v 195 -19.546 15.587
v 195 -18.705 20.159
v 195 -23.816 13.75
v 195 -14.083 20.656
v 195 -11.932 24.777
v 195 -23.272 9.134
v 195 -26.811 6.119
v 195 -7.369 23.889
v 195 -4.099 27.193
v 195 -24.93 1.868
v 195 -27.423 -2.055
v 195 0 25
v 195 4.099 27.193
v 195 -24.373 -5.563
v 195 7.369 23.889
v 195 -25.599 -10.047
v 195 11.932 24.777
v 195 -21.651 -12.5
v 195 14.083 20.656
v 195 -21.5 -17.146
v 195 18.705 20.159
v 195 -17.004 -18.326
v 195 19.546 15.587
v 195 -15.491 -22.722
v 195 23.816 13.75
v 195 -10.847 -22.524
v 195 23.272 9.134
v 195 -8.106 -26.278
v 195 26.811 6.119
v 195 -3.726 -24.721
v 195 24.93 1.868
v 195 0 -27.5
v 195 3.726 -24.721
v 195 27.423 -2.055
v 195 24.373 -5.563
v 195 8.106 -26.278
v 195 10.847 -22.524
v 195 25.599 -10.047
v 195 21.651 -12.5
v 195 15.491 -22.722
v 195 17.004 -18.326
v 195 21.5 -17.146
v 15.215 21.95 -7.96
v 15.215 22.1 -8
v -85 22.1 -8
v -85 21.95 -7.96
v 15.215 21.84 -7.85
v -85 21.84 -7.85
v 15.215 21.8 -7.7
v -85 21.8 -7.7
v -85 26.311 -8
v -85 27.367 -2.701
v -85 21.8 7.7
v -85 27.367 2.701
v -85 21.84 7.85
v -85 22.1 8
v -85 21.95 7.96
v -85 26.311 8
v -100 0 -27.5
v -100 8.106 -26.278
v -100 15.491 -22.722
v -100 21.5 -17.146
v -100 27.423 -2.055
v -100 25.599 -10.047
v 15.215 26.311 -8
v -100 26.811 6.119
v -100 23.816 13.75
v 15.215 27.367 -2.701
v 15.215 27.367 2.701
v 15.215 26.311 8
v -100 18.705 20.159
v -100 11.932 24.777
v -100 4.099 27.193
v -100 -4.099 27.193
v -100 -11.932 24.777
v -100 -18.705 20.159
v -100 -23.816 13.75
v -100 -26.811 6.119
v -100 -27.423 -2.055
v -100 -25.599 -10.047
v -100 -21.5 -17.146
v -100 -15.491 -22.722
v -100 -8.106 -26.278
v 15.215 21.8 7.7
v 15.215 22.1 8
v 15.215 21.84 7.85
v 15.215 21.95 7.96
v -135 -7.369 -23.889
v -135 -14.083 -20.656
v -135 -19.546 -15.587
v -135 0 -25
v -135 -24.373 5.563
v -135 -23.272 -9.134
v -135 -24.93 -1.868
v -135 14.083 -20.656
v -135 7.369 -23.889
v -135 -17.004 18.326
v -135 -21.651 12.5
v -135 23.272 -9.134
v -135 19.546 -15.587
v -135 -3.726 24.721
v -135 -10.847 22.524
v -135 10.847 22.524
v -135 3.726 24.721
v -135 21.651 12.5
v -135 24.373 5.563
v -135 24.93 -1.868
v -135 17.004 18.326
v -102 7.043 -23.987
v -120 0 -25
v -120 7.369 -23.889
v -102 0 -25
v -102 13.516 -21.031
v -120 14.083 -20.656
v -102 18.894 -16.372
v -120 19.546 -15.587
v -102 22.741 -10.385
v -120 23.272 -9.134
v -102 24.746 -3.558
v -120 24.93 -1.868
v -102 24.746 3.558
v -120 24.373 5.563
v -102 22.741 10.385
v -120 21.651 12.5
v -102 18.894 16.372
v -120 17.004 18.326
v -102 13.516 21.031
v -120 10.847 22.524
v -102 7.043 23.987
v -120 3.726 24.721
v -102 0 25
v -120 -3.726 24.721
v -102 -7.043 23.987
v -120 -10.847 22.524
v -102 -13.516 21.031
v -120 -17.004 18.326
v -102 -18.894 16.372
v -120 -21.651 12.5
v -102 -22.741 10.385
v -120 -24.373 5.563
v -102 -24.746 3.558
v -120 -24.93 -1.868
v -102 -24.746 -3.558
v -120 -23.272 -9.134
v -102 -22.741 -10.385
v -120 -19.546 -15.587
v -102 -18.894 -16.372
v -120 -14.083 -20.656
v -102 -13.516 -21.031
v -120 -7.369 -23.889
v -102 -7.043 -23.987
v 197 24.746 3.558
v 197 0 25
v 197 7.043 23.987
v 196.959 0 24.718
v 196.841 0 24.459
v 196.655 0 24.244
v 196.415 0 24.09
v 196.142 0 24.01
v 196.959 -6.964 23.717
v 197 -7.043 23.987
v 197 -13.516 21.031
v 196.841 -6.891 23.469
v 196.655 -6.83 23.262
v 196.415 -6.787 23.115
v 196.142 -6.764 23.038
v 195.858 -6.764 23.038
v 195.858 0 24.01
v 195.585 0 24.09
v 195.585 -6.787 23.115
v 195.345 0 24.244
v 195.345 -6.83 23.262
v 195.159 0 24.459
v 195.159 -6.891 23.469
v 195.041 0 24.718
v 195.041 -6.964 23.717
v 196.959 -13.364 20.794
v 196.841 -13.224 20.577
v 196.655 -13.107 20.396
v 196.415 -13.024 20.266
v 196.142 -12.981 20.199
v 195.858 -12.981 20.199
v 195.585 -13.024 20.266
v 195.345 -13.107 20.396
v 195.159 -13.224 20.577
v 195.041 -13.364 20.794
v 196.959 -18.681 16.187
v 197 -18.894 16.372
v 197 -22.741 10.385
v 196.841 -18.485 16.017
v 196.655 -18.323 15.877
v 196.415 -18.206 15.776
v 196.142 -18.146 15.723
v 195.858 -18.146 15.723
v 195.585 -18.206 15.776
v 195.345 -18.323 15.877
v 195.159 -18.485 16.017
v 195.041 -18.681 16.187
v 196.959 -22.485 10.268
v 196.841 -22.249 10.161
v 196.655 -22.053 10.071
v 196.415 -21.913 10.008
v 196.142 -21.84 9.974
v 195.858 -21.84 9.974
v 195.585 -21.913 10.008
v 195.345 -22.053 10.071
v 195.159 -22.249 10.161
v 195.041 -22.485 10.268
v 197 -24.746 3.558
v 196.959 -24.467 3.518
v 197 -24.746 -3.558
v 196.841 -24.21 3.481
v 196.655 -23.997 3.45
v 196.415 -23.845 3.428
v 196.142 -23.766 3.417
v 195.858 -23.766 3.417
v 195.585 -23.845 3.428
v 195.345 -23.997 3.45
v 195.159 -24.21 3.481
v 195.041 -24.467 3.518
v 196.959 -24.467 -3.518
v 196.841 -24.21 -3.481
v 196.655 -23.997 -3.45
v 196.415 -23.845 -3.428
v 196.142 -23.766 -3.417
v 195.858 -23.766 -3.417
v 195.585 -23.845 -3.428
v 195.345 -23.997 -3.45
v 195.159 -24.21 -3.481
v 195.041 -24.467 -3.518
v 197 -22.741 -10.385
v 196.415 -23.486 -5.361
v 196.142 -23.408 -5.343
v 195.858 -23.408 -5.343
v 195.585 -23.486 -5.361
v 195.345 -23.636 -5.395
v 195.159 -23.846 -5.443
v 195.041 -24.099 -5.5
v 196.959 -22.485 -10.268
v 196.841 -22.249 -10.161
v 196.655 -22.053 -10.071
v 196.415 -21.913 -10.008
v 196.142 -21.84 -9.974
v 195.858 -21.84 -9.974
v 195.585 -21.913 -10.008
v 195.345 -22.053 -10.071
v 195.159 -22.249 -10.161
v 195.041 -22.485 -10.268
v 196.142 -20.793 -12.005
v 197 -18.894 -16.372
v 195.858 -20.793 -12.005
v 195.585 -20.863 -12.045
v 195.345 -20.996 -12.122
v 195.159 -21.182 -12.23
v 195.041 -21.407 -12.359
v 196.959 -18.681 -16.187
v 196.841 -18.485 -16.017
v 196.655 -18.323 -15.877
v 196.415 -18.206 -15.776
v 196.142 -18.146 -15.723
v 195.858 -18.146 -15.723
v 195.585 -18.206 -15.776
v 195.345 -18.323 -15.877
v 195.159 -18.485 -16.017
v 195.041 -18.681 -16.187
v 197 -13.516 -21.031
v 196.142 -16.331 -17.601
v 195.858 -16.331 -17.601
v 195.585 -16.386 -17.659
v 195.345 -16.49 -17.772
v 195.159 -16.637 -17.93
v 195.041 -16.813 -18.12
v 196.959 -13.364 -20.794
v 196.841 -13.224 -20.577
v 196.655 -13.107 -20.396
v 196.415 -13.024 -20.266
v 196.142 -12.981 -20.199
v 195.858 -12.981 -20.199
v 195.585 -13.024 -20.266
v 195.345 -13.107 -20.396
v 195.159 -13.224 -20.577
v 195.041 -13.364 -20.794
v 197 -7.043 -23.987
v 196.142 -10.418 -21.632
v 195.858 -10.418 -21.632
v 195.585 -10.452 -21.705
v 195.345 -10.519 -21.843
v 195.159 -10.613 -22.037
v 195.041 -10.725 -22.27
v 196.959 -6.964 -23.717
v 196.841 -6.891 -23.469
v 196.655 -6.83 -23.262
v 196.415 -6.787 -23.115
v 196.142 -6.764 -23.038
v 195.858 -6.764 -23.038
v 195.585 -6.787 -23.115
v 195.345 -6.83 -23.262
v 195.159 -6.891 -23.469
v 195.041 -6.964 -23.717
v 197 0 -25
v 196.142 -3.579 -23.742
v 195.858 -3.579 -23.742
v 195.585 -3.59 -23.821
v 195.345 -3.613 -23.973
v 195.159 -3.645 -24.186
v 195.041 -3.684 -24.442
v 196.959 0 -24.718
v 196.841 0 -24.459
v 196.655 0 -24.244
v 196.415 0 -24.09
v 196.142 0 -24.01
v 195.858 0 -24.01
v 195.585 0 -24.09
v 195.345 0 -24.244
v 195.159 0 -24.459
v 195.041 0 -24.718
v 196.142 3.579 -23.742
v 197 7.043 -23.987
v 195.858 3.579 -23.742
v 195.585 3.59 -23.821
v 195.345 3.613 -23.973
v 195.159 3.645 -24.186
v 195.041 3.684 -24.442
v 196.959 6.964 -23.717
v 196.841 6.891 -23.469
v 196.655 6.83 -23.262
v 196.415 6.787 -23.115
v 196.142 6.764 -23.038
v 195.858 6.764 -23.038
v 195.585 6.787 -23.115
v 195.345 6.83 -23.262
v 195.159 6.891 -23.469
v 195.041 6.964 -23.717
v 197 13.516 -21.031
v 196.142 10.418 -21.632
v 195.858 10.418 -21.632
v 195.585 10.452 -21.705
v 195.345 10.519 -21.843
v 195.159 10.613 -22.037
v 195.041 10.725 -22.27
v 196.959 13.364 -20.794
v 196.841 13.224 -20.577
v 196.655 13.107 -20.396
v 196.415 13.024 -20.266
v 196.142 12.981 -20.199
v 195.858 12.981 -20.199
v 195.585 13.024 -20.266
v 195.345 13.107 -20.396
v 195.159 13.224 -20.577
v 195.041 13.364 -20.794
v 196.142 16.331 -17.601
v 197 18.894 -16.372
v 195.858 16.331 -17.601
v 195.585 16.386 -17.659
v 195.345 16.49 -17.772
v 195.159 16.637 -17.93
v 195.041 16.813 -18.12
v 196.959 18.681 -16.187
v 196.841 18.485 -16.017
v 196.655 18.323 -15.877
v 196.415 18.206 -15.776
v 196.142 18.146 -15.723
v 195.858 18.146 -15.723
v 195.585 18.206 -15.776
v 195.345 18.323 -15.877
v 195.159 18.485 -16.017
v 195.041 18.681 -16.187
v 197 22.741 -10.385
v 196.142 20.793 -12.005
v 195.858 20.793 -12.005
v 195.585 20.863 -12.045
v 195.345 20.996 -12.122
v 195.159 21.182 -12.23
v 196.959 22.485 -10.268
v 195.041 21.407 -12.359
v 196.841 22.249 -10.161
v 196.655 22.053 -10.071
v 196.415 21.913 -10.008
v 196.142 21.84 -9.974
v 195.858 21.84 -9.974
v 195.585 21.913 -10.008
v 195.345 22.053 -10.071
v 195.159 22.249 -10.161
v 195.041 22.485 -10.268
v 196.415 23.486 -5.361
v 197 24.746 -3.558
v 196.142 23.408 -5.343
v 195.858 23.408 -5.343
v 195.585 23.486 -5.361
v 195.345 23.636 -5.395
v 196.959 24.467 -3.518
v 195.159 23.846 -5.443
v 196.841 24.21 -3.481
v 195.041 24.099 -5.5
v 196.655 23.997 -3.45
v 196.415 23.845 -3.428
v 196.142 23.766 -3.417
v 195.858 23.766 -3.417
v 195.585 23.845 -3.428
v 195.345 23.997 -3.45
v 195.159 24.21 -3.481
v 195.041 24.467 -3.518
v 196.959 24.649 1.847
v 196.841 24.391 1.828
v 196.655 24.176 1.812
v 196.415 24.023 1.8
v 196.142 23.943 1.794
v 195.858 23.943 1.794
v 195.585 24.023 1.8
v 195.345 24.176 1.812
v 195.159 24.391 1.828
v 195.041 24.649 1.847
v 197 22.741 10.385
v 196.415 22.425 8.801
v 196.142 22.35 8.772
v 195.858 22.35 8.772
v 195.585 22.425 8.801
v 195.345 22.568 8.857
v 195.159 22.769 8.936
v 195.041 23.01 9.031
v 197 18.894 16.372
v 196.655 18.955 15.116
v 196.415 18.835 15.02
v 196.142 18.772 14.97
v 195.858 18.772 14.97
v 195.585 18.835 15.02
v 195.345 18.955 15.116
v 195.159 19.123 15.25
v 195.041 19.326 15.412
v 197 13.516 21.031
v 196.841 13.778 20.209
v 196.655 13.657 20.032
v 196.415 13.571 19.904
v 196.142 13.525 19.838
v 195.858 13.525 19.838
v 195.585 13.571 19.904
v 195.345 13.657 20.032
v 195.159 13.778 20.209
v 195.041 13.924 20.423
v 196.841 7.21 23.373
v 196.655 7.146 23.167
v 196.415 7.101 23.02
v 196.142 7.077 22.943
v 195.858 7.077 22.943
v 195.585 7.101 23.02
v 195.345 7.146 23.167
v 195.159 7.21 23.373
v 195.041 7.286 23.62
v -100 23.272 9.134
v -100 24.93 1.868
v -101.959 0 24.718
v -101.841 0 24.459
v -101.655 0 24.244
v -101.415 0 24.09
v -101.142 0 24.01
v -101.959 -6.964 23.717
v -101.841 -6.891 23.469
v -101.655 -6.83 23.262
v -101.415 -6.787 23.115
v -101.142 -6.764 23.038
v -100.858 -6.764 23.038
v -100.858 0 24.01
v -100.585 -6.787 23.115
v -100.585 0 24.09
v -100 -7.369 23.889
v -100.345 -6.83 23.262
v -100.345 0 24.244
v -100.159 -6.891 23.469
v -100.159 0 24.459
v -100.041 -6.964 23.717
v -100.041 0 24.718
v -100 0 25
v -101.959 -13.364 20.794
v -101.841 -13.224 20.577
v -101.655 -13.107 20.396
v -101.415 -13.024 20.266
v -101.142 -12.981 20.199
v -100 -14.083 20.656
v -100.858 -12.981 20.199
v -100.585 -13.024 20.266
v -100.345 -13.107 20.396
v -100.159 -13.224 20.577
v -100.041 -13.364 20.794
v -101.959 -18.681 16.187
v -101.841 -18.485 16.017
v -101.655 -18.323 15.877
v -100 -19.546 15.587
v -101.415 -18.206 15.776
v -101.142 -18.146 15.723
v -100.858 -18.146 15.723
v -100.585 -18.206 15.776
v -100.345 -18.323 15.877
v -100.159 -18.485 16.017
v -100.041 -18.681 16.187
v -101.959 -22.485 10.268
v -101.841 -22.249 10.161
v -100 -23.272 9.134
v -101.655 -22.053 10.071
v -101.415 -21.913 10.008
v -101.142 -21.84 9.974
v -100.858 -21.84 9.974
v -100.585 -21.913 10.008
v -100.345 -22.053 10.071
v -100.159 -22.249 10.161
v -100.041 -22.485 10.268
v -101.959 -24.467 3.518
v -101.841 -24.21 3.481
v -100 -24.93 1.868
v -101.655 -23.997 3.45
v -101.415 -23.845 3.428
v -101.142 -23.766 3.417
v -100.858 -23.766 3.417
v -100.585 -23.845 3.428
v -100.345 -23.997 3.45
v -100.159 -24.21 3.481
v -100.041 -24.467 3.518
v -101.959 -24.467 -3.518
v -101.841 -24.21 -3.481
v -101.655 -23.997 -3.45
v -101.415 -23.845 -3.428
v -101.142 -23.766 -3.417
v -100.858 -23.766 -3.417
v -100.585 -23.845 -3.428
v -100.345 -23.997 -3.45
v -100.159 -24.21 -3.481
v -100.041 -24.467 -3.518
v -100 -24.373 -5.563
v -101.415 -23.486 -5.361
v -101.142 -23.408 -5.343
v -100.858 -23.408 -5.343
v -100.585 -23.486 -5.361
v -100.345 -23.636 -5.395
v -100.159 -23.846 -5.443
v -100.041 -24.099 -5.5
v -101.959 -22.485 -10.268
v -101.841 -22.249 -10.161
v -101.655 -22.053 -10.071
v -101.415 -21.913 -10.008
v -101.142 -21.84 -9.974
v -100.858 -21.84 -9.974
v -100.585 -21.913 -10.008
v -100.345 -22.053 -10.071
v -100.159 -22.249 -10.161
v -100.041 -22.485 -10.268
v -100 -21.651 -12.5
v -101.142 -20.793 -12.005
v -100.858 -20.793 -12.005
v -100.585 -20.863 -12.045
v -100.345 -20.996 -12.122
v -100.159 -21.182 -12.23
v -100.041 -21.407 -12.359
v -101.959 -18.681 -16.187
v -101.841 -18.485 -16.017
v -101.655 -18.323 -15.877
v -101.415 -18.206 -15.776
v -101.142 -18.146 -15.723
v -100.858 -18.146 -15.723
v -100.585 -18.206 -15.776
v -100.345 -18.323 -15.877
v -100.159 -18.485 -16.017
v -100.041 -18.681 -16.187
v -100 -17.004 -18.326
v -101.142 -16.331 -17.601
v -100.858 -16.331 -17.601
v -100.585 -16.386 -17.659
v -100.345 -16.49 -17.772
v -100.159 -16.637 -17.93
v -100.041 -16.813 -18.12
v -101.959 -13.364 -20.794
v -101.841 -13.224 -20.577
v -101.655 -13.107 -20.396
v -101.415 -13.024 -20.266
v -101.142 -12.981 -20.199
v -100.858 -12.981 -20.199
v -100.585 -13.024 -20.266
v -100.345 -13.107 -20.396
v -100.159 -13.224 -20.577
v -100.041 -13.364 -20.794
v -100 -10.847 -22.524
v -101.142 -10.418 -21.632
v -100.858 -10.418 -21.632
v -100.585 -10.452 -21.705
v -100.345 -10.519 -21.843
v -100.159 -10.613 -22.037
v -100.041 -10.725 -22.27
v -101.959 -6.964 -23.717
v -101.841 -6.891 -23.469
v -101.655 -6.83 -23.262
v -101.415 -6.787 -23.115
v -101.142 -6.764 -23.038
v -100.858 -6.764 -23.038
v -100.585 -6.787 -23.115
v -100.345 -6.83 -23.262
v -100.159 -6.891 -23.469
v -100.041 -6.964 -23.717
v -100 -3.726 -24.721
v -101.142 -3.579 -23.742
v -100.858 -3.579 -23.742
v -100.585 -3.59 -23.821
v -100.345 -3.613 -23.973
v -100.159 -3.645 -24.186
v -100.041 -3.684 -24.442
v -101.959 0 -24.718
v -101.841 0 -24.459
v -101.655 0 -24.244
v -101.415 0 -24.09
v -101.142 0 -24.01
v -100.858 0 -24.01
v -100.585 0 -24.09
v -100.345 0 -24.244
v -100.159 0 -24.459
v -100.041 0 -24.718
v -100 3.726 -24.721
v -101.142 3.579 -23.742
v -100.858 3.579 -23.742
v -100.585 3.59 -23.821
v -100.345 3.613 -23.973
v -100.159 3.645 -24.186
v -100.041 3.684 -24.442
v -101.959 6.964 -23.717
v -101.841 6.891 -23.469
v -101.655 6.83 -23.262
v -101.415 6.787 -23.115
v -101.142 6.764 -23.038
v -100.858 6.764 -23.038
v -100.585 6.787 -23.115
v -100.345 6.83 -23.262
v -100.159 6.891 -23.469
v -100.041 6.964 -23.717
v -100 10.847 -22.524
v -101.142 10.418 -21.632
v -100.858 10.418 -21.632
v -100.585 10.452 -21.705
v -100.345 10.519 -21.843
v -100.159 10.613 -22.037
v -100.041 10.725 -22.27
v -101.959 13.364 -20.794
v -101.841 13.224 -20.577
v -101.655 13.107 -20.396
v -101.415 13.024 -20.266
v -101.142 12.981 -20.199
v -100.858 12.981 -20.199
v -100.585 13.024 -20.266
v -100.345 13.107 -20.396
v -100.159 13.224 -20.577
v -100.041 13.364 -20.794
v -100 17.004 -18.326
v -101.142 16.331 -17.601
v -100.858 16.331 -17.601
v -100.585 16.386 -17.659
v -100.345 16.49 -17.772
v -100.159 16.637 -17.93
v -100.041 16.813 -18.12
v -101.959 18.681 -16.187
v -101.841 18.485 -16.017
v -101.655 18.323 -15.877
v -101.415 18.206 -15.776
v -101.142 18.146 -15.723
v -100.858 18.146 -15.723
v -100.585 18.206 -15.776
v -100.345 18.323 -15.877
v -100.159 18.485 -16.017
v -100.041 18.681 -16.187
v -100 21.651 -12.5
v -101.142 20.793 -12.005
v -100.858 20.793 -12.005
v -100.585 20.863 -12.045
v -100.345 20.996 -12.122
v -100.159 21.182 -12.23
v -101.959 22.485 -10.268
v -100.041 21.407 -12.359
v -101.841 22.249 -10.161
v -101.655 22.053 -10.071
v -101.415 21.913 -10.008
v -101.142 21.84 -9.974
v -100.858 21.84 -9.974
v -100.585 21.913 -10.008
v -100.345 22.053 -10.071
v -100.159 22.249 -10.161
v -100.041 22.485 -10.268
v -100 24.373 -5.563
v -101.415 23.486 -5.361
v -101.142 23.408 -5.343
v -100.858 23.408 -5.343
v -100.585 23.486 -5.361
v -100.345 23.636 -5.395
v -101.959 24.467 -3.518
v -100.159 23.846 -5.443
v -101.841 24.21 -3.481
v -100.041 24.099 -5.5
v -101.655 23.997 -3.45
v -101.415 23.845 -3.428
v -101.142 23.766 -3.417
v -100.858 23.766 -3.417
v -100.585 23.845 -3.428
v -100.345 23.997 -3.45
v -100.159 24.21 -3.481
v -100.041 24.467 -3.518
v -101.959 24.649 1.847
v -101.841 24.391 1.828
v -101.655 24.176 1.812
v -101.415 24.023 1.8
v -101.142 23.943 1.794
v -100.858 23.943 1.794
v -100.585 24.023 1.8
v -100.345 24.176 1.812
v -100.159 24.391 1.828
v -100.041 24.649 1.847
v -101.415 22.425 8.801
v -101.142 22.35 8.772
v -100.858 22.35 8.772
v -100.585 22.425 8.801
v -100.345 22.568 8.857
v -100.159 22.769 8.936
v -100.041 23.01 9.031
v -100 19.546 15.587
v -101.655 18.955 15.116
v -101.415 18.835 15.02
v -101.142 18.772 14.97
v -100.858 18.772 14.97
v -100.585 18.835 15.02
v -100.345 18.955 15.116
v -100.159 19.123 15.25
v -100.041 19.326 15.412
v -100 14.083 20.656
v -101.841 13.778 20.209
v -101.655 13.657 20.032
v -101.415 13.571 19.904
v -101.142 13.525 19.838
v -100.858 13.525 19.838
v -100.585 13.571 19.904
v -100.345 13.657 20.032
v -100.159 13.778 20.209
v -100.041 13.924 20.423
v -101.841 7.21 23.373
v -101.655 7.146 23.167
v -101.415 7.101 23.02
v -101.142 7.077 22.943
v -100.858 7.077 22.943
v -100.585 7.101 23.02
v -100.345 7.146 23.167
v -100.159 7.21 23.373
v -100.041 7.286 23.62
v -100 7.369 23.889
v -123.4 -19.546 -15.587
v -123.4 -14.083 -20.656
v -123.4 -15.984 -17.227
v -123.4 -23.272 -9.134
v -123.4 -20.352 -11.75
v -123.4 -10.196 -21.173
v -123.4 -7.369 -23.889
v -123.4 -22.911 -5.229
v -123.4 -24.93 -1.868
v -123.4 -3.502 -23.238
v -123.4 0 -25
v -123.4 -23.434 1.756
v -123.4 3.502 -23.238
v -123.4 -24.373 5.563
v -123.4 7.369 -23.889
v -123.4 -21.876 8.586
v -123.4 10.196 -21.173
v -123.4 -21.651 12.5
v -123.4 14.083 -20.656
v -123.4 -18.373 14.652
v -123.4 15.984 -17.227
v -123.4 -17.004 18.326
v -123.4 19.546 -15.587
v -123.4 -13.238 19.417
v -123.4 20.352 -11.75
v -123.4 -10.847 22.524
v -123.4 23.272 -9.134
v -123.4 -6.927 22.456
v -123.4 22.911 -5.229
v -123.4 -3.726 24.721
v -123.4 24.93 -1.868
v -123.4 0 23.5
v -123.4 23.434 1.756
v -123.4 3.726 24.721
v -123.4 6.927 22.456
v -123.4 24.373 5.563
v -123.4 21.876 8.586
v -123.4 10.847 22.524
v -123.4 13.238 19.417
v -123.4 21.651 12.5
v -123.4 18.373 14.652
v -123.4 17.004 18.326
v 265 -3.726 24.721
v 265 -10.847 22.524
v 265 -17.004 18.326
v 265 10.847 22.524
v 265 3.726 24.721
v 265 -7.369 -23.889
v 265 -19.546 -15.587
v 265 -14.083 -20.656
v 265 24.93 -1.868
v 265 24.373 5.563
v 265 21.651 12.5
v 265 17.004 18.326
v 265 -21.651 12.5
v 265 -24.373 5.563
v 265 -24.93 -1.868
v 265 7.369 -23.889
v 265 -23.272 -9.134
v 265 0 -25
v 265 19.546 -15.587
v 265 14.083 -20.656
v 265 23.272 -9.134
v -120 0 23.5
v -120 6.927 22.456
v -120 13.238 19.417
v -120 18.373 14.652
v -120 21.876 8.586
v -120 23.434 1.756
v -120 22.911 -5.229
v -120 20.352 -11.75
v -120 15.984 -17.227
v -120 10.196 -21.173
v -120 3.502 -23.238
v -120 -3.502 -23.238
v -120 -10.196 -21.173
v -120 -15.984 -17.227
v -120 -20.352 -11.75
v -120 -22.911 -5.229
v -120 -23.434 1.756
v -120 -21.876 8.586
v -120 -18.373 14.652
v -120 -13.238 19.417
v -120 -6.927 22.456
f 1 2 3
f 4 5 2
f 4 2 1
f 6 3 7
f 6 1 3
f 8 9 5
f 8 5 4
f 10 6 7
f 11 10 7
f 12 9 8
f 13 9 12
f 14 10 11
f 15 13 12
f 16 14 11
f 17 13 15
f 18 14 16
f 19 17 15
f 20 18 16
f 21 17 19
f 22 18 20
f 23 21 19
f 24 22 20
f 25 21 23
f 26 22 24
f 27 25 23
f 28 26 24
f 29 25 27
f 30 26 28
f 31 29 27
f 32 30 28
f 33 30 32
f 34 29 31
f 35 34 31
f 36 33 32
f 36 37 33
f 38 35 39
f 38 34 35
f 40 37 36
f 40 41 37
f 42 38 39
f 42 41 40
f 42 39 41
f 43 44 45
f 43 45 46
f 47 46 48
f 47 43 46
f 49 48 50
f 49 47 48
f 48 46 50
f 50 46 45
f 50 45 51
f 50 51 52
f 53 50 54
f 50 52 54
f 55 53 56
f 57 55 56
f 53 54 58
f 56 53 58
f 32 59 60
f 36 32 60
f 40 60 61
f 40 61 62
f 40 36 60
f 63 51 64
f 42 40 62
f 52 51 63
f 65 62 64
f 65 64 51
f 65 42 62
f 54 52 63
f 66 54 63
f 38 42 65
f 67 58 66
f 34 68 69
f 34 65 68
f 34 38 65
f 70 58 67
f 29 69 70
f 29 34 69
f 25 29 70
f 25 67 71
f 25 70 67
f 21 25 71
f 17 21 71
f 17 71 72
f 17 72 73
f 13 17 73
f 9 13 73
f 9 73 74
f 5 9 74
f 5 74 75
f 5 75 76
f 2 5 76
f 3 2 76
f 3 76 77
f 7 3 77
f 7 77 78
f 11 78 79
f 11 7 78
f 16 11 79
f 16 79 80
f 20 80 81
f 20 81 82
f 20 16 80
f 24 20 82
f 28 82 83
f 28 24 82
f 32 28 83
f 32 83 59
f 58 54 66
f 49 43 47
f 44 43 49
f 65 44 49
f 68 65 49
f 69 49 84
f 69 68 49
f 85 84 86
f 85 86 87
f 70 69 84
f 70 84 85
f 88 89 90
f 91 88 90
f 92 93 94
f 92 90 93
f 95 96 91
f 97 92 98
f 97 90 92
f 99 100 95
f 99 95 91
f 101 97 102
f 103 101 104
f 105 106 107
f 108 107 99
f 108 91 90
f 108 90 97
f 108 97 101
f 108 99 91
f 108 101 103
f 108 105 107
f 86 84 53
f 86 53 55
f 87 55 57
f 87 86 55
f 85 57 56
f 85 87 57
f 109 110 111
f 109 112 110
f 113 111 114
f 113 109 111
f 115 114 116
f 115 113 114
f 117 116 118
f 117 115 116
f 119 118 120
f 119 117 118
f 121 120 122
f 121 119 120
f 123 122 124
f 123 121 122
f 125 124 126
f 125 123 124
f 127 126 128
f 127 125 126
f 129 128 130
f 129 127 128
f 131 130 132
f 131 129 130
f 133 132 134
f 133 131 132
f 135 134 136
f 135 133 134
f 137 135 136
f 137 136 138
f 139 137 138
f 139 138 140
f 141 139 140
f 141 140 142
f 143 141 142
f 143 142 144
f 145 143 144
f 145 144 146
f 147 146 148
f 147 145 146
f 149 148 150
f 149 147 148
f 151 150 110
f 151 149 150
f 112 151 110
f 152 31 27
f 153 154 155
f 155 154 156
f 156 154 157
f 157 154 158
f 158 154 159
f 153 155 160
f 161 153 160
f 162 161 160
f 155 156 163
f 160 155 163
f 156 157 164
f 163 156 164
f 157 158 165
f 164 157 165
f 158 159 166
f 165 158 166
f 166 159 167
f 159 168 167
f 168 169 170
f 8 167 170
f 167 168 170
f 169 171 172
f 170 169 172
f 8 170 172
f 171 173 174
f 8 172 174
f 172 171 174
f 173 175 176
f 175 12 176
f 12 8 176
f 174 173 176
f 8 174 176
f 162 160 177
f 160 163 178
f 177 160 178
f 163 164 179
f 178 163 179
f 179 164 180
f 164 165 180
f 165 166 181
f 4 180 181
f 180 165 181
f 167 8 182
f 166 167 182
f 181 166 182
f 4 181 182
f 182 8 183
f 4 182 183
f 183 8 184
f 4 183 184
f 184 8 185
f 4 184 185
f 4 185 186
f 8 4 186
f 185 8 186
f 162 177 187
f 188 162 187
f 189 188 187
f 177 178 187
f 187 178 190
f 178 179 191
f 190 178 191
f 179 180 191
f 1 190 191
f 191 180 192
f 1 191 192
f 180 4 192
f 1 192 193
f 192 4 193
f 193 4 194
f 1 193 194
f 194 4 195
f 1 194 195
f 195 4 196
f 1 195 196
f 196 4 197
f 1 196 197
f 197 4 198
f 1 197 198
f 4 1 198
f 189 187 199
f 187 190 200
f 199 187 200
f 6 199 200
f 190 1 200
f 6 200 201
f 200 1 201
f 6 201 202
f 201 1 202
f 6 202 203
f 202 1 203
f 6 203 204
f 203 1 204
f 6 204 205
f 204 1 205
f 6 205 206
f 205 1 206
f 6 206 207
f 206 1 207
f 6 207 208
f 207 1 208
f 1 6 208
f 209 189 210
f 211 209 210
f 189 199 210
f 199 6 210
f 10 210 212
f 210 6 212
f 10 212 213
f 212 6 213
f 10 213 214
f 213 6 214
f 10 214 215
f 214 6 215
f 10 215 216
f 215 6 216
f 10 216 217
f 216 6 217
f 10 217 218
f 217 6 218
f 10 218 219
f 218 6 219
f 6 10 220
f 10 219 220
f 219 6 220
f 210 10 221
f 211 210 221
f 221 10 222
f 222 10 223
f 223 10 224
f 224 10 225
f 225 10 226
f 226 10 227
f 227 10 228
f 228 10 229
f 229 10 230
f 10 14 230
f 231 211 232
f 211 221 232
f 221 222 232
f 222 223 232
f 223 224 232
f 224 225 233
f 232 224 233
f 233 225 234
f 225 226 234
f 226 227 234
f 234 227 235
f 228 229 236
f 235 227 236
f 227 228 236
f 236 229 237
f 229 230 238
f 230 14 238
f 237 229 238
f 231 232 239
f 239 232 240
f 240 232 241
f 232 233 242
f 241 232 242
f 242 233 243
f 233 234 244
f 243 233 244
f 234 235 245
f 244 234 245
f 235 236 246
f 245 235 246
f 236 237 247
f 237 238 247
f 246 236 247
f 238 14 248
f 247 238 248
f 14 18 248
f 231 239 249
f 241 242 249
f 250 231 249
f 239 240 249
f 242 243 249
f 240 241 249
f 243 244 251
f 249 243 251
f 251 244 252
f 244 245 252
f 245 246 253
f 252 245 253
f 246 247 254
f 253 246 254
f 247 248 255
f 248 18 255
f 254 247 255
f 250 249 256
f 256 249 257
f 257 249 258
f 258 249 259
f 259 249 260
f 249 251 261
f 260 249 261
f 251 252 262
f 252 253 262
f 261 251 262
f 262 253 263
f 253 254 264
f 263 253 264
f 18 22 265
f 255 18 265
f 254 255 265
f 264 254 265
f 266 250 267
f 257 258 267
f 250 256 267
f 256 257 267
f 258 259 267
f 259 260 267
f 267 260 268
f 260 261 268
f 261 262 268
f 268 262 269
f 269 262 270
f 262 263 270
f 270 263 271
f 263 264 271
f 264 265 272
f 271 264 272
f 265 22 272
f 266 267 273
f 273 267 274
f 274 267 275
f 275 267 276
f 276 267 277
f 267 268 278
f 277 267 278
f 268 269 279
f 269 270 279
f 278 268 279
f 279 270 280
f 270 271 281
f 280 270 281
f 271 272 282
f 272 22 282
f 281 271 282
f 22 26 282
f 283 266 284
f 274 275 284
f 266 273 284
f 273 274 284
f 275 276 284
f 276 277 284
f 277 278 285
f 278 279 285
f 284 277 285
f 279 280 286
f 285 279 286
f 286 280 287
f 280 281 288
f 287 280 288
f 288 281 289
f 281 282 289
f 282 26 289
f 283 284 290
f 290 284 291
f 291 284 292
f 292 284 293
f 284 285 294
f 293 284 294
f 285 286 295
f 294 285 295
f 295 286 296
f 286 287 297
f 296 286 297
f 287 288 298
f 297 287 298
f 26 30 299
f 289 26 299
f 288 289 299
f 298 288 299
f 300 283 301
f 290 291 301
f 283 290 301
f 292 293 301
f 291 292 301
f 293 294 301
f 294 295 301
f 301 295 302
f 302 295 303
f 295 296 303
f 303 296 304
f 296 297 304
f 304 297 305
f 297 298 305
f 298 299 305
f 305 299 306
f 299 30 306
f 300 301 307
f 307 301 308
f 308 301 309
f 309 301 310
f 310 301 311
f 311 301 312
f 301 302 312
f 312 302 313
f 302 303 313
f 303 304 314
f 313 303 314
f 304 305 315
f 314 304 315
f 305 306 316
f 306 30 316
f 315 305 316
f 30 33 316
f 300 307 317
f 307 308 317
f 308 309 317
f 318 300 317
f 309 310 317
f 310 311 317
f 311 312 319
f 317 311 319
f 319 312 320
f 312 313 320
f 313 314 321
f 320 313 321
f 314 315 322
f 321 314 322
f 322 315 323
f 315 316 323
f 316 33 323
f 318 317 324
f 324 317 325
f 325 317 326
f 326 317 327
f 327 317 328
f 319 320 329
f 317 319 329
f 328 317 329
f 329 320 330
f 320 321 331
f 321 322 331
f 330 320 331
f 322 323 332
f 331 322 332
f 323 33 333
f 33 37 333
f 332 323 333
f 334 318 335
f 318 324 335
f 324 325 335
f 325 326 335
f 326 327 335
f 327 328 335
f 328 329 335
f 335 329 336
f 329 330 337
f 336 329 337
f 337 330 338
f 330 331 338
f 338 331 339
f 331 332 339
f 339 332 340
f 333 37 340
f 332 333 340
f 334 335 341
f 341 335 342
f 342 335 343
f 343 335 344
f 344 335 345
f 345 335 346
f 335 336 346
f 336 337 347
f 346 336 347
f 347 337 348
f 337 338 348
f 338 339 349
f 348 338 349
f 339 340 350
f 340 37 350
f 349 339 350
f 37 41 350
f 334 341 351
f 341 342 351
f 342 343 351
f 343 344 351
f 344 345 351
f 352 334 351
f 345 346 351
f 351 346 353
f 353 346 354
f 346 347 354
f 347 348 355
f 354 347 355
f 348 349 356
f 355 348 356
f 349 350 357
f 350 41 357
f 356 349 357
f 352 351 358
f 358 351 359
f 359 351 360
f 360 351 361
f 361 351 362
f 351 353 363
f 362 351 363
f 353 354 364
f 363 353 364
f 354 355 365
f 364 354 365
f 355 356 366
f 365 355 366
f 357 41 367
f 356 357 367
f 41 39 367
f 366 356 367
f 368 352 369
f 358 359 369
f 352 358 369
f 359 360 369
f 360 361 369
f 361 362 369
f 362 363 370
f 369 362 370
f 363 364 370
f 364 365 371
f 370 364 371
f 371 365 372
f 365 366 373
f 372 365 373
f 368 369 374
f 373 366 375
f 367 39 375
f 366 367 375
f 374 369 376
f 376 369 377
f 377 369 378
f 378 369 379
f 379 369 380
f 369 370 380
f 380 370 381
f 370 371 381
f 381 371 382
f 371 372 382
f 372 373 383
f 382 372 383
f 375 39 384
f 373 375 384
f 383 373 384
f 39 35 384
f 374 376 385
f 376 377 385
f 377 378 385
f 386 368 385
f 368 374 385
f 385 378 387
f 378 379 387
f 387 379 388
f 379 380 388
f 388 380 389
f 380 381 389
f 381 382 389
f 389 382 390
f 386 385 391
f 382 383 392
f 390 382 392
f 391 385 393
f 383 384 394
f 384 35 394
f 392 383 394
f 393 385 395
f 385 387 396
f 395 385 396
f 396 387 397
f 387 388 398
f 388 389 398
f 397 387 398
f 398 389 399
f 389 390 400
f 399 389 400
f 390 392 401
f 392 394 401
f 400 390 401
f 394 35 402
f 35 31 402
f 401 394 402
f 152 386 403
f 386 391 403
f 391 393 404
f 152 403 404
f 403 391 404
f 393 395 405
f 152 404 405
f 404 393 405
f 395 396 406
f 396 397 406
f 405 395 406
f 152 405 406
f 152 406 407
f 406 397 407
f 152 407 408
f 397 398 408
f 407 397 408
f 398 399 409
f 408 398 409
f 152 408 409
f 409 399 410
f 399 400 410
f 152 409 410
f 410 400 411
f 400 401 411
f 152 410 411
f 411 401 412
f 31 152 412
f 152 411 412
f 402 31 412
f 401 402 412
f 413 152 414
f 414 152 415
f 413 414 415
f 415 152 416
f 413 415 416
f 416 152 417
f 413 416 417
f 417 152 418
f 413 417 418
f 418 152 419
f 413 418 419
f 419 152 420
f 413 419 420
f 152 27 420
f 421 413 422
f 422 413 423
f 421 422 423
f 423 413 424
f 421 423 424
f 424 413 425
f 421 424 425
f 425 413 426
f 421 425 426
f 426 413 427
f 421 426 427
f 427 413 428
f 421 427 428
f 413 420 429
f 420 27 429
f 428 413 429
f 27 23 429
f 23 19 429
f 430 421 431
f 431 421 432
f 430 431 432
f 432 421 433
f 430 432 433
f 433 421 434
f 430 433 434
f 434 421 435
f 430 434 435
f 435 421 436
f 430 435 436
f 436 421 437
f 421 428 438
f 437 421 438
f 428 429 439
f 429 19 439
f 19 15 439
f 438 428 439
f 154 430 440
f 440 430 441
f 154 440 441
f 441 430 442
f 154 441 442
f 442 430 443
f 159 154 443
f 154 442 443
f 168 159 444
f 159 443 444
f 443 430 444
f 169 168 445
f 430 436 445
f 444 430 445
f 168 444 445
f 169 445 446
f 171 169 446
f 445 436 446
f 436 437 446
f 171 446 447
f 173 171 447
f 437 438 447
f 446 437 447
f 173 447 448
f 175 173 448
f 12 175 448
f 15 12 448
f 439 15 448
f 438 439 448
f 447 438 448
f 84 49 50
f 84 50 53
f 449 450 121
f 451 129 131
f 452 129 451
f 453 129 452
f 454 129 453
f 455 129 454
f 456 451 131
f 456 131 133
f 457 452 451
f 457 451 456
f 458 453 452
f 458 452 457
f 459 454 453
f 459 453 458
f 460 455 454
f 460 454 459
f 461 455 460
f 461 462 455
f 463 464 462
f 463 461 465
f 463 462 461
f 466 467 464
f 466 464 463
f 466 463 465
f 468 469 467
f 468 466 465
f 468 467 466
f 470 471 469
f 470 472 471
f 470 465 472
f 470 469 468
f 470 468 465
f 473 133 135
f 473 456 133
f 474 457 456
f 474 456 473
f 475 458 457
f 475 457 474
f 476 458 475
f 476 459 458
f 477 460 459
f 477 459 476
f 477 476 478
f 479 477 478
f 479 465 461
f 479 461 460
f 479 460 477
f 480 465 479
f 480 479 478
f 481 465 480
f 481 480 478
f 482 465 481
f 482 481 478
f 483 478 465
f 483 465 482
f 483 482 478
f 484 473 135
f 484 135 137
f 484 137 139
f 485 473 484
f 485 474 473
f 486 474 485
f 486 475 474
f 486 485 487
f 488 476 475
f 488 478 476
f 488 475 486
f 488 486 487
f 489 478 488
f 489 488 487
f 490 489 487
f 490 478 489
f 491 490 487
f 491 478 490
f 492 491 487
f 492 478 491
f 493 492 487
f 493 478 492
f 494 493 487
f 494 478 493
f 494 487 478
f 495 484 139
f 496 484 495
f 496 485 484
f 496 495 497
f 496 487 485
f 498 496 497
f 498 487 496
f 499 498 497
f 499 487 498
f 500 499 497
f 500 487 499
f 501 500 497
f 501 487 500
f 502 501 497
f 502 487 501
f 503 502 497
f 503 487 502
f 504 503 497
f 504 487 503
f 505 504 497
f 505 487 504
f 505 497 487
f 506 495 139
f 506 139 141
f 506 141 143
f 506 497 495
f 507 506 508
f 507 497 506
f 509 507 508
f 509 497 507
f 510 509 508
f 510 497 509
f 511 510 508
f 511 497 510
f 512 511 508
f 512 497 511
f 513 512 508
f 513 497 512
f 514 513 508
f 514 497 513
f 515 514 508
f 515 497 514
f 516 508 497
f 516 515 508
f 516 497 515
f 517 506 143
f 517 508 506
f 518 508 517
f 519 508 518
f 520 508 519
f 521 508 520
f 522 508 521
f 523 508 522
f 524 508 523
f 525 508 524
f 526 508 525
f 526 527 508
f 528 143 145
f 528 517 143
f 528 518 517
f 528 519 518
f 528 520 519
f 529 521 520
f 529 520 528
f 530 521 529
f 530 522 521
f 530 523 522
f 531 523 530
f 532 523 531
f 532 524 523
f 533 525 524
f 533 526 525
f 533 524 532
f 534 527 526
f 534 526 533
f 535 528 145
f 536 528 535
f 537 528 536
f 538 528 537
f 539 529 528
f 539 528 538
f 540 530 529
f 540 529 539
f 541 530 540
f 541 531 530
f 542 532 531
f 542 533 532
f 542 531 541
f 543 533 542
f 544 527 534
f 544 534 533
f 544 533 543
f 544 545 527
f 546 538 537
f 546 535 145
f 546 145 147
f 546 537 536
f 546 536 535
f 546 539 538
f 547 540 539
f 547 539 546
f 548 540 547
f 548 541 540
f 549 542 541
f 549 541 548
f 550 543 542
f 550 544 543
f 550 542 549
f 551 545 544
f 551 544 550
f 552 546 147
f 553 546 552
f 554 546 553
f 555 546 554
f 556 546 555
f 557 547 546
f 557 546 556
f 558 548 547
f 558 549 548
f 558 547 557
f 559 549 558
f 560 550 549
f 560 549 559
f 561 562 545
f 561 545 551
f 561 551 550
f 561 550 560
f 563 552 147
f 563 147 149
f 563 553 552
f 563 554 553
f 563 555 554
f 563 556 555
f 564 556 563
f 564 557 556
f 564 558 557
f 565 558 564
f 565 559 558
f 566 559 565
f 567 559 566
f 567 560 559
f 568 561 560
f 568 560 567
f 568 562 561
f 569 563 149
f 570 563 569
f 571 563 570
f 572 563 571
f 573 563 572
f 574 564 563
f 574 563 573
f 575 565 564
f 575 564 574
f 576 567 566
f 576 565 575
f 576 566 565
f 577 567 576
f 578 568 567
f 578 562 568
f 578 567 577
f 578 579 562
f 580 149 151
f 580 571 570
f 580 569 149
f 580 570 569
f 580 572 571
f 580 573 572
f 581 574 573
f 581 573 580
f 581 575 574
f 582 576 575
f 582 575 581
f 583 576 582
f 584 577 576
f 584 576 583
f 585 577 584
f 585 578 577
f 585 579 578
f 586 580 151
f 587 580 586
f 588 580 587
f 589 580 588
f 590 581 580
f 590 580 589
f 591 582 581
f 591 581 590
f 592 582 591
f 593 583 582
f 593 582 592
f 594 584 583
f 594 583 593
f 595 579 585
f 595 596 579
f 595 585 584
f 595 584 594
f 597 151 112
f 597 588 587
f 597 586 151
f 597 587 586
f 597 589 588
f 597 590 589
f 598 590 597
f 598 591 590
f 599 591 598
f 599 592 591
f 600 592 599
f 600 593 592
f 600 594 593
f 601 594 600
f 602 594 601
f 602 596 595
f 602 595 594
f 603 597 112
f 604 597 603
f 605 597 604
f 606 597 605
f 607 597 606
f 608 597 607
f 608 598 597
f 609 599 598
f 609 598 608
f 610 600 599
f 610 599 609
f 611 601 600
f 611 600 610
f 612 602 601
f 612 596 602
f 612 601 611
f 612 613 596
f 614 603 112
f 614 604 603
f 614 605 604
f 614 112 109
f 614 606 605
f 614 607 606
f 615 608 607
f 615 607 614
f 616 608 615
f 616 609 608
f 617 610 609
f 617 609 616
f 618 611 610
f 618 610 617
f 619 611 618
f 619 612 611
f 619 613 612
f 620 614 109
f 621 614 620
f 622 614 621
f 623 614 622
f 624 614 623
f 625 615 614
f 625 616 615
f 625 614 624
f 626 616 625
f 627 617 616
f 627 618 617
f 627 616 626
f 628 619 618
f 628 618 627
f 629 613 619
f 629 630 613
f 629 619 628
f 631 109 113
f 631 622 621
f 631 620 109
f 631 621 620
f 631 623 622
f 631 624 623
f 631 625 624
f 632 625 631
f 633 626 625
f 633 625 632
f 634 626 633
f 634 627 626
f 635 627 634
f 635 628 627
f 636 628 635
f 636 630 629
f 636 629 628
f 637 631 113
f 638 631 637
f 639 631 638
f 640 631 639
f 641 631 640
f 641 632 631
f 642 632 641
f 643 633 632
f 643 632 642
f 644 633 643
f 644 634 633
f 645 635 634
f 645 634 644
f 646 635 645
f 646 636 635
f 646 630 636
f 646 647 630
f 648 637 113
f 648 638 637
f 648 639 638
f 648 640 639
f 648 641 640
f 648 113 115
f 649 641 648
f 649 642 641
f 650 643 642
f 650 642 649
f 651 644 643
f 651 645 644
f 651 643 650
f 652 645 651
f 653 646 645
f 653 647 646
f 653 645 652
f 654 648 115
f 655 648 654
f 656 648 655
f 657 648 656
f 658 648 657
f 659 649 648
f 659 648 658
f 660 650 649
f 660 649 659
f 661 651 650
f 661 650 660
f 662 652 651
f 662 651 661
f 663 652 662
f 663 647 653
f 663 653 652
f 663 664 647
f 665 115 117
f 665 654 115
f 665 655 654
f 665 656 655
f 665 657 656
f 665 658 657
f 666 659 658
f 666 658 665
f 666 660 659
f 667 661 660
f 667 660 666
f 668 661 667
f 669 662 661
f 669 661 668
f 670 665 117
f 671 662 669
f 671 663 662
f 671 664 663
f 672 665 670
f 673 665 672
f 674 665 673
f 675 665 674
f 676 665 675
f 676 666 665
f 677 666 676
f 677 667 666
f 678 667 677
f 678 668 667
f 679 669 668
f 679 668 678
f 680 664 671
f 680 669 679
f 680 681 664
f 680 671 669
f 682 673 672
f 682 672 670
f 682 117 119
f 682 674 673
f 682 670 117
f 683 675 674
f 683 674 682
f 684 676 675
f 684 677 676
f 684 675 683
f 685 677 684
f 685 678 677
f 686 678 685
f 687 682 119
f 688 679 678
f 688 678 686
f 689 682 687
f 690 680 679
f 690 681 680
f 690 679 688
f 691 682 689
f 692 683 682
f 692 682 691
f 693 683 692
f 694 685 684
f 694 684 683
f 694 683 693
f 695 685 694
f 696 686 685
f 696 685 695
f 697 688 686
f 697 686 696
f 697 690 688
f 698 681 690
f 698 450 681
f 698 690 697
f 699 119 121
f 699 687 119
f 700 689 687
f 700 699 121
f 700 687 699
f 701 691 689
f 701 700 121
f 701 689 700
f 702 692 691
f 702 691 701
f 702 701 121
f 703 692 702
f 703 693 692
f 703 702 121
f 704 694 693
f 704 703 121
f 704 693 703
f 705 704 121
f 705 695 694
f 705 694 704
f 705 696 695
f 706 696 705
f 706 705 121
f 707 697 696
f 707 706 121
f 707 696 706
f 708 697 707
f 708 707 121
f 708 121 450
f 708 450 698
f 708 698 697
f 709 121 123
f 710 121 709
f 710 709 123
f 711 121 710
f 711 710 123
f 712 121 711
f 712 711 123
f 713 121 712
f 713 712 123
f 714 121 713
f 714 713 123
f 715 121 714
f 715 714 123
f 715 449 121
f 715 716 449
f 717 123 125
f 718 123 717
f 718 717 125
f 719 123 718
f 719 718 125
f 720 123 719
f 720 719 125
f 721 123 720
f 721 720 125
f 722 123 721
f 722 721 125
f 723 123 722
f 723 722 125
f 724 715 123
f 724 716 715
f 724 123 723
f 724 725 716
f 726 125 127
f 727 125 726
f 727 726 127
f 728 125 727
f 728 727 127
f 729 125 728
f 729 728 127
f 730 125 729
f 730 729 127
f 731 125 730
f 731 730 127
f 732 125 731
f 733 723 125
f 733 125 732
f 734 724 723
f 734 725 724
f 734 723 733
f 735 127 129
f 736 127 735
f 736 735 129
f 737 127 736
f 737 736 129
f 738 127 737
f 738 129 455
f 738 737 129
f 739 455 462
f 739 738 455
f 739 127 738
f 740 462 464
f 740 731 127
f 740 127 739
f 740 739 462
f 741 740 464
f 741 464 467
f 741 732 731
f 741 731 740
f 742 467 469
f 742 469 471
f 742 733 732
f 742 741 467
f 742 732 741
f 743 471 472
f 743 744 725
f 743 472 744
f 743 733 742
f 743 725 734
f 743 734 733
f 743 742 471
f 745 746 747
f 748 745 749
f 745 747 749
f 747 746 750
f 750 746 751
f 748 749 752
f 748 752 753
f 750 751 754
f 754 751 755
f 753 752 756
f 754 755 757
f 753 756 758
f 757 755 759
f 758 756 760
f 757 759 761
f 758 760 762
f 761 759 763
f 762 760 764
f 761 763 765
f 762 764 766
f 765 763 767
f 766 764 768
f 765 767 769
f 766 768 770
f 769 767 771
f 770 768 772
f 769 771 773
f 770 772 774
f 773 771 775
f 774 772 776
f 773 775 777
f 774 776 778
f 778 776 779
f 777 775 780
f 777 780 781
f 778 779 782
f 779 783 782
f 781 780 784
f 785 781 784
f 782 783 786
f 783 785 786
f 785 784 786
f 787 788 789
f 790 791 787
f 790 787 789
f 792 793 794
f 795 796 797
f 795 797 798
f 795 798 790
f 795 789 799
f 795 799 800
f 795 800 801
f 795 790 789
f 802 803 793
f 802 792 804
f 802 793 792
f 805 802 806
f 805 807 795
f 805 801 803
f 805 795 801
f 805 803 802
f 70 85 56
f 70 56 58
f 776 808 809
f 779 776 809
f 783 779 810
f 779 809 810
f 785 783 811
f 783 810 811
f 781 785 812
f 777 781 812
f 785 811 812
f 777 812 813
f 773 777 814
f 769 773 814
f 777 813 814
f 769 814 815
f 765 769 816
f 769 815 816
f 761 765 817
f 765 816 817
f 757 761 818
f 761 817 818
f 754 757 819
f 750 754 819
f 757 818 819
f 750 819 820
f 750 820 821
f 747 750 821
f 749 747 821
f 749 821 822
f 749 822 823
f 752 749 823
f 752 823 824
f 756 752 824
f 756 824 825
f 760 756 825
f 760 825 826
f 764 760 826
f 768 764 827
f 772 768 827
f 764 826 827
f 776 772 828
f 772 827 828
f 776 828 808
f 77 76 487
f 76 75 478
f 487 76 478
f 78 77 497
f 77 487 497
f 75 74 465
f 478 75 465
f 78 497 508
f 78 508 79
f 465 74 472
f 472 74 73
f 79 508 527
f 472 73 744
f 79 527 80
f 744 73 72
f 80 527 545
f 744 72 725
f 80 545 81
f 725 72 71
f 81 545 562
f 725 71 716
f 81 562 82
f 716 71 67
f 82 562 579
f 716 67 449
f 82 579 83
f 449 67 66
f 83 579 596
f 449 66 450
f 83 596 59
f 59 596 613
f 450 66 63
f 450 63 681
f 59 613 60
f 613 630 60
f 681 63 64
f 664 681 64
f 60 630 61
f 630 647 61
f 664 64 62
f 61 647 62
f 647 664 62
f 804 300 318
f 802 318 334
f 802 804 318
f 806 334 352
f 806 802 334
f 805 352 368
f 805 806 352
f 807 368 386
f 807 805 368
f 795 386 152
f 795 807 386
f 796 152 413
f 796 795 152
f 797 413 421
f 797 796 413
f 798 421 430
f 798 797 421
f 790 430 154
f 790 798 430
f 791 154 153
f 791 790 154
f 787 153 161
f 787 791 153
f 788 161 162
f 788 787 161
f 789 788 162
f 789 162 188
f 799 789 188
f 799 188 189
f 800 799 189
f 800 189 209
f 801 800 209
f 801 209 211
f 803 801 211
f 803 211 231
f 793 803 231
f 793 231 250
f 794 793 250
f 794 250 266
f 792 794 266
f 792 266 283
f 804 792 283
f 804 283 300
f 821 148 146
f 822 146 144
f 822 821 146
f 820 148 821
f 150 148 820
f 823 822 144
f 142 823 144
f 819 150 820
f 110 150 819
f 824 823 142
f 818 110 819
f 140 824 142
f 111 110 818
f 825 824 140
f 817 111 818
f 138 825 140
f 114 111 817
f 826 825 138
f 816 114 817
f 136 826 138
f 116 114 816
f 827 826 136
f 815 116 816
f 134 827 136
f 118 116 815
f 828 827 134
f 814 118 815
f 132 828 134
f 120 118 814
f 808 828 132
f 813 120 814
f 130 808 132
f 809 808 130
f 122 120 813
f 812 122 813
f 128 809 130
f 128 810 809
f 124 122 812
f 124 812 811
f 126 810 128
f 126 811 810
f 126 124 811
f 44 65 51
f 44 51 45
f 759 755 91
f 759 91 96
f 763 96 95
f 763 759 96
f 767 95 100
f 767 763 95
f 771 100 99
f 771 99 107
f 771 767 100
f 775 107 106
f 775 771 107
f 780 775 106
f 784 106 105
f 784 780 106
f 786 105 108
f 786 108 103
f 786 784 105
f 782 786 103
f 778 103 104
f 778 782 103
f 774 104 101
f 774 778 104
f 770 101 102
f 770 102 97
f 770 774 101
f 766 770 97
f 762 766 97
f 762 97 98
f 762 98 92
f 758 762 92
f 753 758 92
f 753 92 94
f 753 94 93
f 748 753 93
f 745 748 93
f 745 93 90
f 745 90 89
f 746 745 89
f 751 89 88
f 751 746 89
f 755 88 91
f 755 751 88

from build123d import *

# Parameters (mm, degrees)
SKETCH1_R           = 27.5
BOSS_EXTRUDE1_DEPTH = 100
SKETCH1_4_R         = 25
BOSS_EXTRUDE2_DEPTH = 175
BOSS_EXTRUDE4_START = 95
SKETCH6_R           = 27.5
SKETCH6_R_2         = 25
BOSS_EXTRUDE4_DEPTH = 95
BOSS_EXTRUDE5_START = 90
SKETCH8_R           = 25
BOSS_EXTRUDE5_DEPTH = 90
CUT_EXTRUDE1_START  = -115.215
CUT_EXTRUDE1_DEPTH  = 100.215
CUT_EXTRUDE3_START  = -40
SKETCH10_R          = 25
CUT_EXTRUDE3_DEPTH  = 40
CUT_EXTRUDE4_START  = 20
SKETCH11_R          = 25
SKETCH11_R_2        = 23.5
CUT_EXTRUDE4_DEPTH  = 3.4


with BuildPart() as part:
    # Sketch1 → Boss-Extrude1 (new, symmetric)
    with BuildSketch(Plane(origin=(0, 0, 0), x_dir=(0, 0, -1), z_dir=(1, 0, 0))):
        Circle(SKETCH1_R)
    extrude(amount=BOSS_EXTRUDE1_DEPTH, both=True)

    # Sketch1<4> → Boss-Extrude2 (add, symmetric)
    with BuildSketch(Plane(origin=(0, 0, 0), x_dir=(0, 0, -1), z_dir=(1, 0, 0))):
        Circle(SKETCH1_4_R)
    extrude(amount=BOSS_EXTRUDE2_DEPTH, both=True)

    # Sketch6 → Boss-Extrude4 (add)
    with BuildSketch(Plane(origin=(100, 0, 0), x_dir=(0, 0, -1), z_dir=(1, 0, 0)).offset(BOSS_EXTRUDE4_START)):
        Circle(SKETCH6_R)
        Circle(SKETCH6_R_2, mode=Mode.SUBTRACT)
    extrude(amount=-BOSS_EXTRUDE4_DEPTH)

    # Sketch8 → Boss-Extrude5 (add)
    with BuildSketch(Plane(origin=(175, 0, 0), x_dir=(0, 0, -1), z_dir=(1, 0, 0)).offset(BOSS_EXTRUDE5_START)):
        Circle(SKETCH8_R)
    extrude(amount=-BOSS_EXTRUDE5_DEPTH)

    # Sketch3 → Cut-Revolve1 (revolve, cut)
    with BuildSketch(Plane.XY):
        with BuildLine():
            Line((195, 25), (197, 25))
            ThreePointArc((197, 25), (196, 24), (195, 25))
        make_face()
        with BuildLine():
            Line((-100, 25), (-102, 25))
            ThreePointArc((-102, 25), (-101, 24), (-100, 25))
        make_face()
    revolve(axis=Axis((-100, 0, 0), (1, 0, 0)), mode=Mode.SUBTRACT)

    # Sketch4 → Cut-Extrude1 (cut)
    with BuildSketch(Plane.ZY.offset(100).offset(CUT_EXTRUDE1_START)):
        with BuildLine():
            Line((-8, 26.310644234), (-8, 22.1))
            ThreePointArc((-8, 22.1), (-7.912132034, 21.887867966), (-7.7, 21.8))
            Line((-7.7, 21.8), (7.7, 21.8))
            ThreePointArc((7.7, 21.8), (7.912132034, 21.887867966), (8, 22.1))
            Line((8, 22.1), (8, 26.310644234))
            ThreePointArc((8, 26.310644234), (0, 27.5), (-8, 26.310644234))
        make_face()
    extrude(amount=CUT_EXTRUDE1_DEPTH, mode=Mode.SUBTRACT)

    # Sketch10 → Cut-Extrude3 (cut)
    with BuildSketch(Plane.ZY.offset(175).offset(CUT_EXTRUDE3_START)):
        Circle(SKETCH10_R)
    extrude(amount=CUT_EXTRUDE3_DEPTH, mode=Mode.SUBTRACT)

    # Sketch11 → Cut-Extrude4 (cut)
    with BuildSketch(Plane.ZY.offset(100).offset(CUT_EXTRUDE4_START)):
        Circle(SKETCH11_R)
        Circle(SKETCH11_R_2, mode=Mode.SUBTRACT)
    extrude(amount=CUT_EXTRUDE4_DEPTH, mode=Mode.SUBTRACT)


solid = part.part
